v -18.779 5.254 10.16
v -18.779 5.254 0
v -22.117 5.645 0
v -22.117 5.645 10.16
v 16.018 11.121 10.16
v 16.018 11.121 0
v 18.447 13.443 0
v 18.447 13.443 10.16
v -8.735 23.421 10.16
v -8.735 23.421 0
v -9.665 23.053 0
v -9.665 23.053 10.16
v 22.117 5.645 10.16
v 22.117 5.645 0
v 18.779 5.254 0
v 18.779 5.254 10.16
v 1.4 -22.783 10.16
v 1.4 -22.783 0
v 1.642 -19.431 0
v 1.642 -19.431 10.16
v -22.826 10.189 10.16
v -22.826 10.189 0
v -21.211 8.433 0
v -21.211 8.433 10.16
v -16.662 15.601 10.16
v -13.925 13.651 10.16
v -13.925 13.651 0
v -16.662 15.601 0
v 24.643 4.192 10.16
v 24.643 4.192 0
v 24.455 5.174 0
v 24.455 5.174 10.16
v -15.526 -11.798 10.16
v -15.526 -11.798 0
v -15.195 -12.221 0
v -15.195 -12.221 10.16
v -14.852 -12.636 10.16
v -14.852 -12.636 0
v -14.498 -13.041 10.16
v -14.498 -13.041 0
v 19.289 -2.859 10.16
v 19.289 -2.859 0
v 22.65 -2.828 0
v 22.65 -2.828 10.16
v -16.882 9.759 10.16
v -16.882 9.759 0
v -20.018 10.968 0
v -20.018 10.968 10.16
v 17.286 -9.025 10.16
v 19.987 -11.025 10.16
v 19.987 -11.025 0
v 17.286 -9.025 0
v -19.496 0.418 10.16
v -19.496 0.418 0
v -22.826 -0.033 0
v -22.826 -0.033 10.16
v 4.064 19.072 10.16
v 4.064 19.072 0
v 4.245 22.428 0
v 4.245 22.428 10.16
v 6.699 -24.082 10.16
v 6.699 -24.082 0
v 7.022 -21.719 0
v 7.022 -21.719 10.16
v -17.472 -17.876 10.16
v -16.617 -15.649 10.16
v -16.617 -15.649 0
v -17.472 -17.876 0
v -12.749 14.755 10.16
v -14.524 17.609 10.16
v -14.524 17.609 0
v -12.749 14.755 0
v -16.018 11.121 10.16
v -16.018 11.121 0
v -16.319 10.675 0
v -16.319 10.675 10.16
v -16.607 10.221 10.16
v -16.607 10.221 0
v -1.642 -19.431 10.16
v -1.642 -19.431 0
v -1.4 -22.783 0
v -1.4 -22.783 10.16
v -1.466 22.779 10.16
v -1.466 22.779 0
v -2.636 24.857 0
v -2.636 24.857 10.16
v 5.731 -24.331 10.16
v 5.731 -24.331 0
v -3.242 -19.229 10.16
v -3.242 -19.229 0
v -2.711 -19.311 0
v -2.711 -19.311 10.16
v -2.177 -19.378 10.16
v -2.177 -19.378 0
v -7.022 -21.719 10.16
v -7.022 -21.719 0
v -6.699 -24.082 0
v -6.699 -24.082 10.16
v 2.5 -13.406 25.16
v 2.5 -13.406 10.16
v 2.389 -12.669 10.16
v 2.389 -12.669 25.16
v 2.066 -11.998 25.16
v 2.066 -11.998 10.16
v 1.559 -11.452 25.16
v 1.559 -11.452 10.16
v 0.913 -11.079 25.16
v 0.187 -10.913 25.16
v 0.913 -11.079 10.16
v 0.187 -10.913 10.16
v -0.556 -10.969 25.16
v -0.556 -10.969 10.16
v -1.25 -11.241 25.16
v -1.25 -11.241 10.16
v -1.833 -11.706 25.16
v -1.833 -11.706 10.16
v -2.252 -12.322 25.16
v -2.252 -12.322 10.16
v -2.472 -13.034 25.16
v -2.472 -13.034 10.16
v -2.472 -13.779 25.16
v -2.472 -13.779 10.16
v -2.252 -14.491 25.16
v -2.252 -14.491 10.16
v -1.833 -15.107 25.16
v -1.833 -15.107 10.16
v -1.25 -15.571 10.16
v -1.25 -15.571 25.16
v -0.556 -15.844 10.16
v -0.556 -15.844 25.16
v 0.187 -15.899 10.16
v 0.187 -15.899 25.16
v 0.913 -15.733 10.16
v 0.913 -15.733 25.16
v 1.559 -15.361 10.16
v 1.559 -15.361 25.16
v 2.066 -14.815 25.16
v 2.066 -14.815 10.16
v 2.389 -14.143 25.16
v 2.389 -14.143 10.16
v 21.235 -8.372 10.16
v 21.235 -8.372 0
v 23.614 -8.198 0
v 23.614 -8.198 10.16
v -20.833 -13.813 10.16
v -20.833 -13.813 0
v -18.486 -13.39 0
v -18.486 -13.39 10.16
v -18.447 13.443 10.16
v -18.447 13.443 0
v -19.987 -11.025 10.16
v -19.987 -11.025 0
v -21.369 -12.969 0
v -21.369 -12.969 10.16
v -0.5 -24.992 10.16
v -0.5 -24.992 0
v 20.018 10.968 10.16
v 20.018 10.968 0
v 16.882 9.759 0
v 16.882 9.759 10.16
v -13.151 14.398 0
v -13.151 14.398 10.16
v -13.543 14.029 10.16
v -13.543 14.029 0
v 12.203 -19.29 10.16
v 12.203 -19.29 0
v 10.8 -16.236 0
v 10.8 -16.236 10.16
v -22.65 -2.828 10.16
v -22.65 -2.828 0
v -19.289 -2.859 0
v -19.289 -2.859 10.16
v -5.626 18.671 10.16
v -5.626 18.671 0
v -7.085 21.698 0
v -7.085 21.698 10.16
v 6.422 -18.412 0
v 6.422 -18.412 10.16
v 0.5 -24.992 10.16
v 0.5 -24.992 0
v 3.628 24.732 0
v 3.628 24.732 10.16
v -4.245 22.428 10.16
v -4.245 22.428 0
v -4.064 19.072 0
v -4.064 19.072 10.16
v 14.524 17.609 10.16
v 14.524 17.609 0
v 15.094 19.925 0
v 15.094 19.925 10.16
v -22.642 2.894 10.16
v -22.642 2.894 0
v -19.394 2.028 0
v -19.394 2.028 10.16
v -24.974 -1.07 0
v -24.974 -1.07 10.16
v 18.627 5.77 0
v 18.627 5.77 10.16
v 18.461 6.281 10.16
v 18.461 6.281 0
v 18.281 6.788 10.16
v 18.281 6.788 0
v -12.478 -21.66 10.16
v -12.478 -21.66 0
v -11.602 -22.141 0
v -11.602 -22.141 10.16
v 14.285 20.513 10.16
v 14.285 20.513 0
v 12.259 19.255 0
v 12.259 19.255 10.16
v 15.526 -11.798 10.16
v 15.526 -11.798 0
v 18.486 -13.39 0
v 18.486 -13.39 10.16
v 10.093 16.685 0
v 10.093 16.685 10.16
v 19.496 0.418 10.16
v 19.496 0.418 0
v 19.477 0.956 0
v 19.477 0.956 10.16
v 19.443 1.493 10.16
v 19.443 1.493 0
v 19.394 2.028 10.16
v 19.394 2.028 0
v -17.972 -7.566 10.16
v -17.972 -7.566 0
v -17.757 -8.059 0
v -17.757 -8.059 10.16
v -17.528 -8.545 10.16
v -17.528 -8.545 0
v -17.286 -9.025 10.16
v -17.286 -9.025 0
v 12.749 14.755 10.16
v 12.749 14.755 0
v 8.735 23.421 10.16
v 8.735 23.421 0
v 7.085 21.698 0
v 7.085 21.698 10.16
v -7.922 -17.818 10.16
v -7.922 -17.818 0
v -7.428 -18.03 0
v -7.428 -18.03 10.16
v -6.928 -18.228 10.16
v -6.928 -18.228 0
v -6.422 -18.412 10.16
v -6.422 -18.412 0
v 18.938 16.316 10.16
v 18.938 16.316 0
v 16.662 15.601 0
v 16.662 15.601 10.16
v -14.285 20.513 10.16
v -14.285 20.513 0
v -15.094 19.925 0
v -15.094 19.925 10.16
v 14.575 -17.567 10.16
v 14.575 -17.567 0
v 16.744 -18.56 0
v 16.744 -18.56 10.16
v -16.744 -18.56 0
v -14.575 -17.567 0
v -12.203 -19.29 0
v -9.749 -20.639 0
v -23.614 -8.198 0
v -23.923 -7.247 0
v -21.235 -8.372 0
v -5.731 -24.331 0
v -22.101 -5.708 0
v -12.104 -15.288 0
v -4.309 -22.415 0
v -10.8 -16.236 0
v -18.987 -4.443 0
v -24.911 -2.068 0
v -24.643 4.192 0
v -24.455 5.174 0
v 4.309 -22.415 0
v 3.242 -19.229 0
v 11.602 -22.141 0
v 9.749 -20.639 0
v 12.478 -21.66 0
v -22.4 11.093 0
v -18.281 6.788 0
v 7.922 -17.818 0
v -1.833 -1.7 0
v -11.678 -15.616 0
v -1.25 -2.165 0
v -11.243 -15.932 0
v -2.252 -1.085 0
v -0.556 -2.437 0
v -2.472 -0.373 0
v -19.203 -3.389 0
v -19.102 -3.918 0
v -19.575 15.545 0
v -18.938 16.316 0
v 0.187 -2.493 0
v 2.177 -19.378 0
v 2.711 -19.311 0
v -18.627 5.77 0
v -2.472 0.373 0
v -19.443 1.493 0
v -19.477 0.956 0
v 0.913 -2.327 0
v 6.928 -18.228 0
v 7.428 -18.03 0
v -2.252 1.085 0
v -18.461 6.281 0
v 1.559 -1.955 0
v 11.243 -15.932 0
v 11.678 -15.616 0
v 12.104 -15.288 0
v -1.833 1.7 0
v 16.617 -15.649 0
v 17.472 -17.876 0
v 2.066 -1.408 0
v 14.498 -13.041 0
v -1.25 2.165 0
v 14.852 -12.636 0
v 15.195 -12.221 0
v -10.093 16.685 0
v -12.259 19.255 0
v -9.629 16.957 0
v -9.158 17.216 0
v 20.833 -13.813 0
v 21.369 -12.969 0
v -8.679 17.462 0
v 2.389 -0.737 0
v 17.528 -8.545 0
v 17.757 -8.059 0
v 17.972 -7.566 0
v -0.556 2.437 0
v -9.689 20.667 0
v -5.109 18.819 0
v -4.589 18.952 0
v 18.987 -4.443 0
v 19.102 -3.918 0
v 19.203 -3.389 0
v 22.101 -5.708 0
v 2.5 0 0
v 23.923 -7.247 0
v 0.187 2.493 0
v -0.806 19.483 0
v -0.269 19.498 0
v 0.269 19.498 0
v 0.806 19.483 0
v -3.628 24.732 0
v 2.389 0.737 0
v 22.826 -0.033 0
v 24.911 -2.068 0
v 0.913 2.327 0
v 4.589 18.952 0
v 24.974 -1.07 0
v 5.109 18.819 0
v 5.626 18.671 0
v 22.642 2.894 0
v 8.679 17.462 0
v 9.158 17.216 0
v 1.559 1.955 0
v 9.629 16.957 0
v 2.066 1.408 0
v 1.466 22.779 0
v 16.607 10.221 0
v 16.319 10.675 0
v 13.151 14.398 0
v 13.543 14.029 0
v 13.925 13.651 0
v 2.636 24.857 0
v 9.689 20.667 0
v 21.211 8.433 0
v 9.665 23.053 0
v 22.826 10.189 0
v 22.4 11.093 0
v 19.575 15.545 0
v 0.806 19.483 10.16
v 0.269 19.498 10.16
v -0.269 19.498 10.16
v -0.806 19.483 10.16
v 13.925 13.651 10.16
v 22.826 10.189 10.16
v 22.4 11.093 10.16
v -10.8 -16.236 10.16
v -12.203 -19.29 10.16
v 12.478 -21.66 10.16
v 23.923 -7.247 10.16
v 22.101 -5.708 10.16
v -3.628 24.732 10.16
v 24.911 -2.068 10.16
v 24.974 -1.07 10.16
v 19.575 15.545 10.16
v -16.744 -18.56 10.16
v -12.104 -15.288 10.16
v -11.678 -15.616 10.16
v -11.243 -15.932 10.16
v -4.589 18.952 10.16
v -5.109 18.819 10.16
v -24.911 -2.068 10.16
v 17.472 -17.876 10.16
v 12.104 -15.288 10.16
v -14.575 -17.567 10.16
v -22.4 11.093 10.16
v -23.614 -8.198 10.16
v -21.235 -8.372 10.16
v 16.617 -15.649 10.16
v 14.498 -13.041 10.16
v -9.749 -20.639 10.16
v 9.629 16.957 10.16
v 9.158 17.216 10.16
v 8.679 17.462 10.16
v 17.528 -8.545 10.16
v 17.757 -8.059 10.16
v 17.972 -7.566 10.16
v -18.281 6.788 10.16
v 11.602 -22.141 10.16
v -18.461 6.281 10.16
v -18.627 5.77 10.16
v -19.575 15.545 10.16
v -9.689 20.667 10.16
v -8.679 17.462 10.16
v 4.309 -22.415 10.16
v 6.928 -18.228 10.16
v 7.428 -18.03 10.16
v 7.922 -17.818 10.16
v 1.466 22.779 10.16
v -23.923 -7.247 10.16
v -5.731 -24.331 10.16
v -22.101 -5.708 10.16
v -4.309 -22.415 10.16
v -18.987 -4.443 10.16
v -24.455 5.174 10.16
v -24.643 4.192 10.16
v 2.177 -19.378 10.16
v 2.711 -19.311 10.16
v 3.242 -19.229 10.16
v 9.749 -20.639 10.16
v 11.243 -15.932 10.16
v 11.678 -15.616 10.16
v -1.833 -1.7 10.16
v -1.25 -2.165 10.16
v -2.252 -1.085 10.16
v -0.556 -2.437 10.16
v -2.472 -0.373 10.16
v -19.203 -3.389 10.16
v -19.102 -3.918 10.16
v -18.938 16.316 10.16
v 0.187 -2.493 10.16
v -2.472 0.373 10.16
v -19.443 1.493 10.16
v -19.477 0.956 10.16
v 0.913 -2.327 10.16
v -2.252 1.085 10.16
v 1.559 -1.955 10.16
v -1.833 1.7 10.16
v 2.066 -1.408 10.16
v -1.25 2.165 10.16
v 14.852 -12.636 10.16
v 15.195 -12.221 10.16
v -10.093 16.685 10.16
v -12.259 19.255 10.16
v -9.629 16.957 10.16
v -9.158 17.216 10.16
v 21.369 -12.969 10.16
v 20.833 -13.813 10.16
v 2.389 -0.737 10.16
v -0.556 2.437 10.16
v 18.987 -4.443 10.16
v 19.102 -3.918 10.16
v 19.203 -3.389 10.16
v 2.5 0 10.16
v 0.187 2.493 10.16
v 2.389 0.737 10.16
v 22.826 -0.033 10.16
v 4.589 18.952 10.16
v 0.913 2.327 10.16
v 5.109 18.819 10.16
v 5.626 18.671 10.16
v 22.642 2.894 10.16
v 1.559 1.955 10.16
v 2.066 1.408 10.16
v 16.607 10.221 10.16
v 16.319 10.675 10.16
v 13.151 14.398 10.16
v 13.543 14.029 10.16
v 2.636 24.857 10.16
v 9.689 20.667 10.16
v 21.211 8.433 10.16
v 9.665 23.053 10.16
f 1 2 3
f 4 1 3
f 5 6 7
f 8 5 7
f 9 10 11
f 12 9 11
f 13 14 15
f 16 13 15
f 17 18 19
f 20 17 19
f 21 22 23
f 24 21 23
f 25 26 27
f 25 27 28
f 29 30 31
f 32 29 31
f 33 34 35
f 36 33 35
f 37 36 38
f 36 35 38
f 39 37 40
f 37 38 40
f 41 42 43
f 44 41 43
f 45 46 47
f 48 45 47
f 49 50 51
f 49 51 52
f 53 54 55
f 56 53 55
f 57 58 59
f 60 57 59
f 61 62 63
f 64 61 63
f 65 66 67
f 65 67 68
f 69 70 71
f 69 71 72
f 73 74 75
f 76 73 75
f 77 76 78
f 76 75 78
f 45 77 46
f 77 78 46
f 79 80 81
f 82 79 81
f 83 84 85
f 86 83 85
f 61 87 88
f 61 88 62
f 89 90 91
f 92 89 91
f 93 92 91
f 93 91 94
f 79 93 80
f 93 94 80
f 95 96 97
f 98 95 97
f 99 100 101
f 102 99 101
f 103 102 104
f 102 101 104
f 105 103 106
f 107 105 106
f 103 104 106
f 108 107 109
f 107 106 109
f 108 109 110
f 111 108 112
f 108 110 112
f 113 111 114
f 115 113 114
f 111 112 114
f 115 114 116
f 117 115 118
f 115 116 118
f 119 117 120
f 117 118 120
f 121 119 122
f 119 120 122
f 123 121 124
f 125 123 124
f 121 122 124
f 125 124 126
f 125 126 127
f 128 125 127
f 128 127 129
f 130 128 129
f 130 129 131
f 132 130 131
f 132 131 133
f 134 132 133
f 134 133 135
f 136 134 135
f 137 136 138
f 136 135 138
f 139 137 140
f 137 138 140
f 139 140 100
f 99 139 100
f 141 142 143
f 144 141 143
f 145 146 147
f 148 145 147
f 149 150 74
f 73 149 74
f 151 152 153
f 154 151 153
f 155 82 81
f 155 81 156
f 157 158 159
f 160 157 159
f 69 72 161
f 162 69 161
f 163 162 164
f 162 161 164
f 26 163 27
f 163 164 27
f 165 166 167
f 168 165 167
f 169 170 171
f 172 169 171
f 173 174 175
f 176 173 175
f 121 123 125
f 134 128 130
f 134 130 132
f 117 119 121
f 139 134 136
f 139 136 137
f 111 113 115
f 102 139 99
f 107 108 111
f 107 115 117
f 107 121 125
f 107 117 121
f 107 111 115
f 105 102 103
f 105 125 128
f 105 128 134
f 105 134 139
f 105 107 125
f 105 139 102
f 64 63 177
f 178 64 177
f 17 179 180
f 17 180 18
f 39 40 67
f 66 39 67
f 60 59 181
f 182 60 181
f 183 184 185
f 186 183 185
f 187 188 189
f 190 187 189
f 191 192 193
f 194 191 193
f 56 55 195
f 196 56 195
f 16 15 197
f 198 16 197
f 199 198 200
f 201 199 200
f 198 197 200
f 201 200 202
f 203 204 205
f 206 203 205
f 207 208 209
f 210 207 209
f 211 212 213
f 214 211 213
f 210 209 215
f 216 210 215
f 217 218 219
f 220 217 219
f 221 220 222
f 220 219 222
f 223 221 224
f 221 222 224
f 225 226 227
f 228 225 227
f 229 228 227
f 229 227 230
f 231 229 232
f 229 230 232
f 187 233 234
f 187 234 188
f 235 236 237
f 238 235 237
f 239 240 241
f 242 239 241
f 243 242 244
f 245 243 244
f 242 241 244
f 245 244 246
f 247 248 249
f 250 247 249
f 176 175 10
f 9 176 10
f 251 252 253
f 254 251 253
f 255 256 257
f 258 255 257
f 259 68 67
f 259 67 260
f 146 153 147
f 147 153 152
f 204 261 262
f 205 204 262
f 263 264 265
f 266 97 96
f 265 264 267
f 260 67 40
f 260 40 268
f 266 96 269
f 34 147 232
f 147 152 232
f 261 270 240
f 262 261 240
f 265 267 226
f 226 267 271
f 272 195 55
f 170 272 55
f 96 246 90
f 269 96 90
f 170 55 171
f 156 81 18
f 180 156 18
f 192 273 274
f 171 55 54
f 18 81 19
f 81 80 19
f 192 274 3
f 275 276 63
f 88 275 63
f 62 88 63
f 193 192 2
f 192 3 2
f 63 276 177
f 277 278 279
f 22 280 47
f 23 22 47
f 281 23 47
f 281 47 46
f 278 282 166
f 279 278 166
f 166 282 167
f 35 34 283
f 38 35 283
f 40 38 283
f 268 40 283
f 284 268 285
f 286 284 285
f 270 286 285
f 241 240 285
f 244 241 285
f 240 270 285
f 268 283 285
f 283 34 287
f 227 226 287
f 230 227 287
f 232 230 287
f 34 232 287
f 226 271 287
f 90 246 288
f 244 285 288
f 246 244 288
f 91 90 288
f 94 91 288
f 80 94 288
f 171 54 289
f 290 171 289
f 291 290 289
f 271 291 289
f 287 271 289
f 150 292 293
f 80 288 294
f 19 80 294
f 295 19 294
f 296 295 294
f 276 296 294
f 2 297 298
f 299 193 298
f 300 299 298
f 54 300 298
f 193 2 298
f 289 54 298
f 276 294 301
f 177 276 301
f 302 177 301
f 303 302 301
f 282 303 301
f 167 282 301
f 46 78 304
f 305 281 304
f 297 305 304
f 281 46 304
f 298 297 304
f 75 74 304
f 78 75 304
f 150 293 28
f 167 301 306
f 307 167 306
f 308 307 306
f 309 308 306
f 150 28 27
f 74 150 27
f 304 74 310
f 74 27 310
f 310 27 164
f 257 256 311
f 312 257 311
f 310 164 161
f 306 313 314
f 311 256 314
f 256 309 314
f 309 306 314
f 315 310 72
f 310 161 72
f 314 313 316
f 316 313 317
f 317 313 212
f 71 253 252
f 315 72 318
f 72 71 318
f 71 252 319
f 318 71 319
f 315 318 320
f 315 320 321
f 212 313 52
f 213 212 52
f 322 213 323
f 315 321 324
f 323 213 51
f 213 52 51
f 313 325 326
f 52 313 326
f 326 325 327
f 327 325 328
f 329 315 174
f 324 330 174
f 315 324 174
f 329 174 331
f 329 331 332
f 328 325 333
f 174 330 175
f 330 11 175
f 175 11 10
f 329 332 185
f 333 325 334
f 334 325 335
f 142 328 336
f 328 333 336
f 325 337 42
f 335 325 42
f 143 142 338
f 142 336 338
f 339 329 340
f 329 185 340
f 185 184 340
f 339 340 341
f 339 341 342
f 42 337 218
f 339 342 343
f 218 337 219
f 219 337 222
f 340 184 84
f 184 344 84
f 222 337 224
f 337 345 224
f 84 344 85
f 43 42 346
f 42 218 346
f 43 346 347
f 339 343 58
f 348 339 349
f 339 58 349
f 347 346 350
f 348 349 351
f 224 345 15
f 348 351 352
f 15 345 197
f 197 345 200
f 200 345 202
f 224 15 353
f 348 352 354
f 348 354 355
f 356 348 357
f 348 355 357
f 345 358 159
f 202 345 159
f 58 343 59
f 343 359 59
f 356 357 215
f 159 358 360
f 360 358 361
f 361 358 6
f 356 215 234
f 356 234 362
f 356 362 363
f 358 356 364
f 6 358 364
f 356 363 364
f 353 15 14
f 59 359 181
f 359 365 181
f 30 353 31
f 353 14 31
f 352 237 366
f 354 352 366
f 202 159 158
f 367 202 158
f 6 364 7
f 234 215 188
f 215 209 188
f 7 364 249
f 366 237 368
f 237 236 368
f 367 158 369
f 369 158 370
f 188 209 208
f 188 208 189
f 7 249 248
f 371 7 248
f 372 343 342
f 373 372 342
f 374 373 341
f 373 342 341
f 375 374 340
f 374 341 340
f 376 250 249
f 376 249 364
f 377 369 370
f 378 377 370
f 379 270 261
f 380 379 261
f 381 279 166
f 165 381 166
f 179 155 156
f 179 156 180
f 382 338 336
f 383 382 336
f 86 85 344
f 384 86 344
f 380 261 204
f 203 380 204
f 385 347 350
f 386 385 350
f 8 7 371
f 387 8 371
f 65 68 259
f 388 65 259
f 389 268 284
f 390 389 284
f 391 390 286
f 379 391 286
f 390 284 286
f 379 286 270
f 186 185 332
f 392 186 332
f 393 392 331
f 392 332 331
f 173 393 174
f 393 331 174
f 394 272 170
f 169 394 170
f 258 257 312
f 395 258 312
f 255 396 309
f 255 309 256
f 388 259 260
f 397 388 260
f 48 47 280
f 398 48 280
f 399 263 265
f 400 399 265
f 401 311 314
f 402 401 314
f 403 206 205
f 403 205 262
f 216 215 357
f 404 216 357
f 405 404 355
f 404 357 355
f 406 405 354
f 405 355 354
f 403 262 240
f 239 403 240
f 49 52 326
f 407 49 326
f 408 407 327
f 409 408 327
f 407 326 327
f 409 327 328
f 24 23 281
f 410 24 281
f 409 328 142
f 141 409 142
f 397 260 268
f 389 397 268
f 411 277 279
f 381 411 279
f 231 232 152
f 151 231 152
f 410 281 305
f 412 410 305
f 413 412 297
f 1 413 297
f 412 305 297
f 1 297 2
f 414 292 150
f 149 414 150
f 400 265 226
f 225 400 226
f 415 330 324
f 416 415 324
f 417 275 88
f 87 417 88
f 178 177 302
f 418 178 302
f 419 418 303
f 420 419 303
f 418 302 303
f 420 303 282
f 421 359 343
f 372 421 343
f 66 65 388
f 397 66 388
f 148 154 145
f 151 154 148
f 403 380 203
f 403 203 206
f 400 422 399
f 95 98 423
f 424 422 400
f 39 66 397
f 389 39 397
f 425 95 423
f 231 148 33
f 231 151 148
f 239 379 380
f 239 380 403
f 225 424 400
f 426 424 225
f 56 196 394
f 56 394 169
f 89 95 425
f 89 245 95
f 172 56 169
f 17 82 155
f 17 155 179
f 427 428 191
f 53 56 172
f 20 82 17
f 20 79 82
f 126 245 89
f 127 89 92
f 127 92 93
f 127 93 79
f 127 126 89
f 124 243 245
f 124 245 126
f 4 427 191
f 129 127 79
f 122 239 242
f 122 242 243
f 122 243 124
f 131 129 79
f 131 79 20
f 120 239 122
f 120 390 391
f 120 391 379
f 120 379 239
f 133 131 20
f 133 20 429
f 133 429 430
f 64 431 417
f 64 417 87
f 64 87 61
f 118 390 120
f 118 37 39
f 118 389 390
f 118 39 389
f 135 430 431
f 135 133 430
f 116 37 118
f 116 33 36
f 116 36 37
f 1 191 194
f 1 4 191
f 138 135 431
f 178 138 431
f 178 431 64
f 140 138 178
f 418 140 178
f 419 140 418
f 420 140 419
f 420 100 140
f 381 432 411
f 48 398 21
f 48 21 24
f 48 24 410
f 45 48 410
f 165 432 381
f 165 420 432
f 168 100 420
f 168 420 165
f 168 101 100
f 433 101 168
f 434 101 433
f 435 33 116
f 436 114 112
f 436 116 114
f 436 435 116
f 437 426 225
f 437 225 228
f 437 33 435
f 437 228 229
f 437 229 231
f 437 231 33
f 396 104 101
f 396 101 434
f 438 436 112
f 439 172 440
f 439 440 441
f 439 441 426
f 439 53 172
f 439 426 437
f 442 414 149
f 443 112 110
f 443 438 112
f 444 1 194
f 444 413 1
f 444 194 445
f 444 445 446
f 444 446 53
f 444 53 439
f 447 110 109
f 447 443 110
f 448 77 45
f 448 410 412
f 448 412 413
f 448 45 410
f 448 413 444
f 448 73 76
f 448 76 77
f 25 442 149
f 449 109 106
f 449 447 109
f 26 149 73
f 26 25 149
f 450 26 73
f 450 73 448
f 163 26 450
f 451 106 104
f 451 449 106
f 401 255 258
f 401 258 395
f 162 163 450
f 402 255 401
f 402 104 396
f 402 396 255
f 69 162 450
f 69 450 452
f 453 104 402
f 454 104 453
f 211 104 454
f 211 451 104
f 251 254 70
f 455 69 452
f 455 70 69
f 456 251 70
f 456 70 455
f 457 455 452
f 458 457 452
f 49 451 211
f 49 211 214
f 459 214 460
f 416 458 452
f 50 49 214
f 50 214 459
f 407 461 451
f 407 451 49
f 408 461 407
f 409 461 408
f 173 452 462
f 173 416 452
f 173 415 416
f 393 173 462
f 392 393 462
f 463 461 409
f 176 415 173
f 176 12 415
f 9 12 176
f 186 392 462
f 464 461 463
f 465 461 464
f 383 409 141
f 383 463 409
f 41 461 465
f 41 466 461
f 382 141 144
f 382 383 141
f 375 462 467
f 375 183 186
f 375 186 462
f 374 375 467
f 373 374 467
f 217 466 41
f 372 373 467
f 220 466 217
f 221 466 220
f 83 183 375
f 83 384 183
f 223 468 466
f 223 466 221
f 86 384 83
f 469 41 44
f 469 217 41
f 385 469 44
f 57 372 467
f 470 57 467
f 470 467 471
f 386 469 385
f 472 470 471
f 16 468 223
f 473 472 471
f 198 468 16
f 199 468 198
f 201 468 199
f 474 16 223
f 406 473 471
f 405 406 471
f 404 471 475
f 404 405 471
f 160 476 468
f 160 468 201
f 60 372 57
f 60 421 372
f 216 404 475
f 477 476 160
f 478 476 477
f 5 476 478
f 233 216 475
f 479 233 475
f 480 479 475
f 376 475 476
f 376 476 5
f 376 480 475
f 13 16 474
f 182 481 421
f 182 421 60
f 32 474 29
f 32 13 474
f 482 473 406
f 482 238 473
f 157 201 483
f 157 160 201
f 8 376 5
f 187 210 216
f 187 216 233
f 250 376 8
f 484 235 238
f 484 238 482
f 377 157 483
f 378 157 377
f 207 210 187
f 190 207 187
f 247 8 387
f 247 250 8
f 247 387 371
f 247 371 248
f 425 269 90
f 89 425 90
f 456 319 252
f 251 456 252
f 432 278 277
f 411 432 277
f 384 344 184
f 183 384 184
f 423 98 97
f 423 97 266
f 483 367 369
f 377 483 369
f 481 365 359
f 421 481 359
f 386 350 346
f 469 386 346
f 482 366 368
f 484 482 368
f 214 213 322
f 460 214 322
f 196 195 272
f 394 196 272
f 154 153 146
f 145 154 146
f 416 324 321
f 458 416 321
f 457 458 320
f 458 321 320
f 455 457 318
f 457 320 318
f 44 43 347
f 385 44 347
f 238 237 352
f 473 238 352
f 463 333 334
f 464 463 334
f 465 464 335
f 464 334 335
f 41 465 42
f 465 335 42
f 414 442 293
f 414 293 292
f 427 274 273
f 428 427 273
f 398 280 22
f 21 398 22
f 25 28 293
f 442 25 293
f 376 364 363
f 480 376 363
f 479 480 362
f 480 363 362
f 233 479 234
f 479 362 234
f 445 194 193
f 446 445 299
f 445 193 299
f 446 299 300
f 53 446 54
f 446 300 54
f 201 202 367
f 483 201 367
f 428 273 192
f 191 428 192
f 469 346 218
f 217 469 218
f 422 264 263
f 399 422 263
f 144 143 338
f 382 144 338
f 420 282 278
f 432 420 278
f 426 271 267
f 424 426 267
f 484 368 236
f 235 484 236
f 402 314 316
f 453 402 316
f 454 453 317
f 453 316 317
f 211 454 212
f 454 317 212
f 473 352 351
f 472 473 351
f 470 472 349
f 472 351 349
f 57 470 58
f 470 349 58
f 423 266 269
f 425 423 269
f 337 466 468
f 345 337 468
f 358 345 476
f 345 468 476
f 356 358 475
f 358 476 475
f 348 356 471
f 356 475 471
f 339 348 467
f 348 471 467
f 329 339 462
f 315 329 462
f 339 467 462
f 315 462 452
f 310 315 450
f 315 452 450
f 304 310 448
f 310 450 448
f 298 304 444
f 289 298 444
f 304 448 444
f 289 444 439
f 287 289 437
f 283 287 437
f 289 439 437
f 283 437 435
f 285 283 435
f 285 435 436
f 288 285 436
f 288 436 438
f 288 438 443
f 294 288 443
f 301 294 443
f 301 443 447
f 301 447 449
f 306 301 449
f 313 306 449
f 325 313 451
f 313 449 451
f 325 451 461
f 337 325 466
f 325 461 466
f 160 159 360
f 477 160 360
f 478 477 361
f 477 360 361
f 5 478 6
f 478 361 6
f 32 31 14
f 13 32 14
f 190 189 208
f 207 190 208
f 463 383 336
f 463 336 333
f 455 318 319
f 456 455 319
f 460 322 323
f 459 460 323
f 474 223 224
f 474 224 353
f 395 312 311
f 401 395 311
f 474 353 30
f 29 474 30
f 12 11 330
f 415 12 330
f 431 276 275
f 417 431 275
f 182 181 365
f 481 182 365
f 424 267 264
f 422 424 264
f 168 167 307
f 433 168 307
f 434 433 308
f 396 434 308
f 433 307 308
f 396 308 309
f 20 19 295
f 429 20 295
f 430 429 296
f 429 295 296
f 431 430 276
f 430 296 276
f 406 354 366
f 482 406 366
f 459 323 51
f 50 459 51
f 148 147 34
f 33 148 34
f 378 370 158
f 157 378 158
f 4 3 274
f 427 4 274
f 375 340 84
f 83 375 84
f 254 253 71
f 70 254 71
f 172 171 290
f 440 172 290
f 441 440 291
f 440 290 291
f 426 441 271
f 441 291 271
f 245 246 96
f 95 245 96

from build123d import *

# Parameters (mm, degrees)
BOSS_EXTRUDE1_DEPTH = 10.16
SKETCH2_R           = 2.5
CUT_EXTRUDE1_DEPTH  = 10.16
SKETCH5_R           = 2.5
BOSS_EXTRUDE2_DEPTH = 15


with BuildPart() as part:
    # Sketch1 → Boss-Extrude1 (new body)
    with BuildSketch(Plane.XY):
        with BuildLine():
            Line((21.369115072, -12.969065822), (19.986578913, -11.025302977))
            Line((19.986578913, -11.025302977), (17.28565357, -9.025307787))
            ThreePointArc((17.28565357, -9.025307787), (17.644127523, -8.302696186), (17.972409434, -7.565877287))
            Line((17.972409434, -7.565877287), (21.235066822, -8.372131118))
            Line((21.235066822, -8.372131118), (23.614023549, -8.19839247))
            Line((23.614023549, -8.19839247), (23.923040543, -7.247335954))
            Line((23.923040543, -7.247335954), (22.100545137, -5.708462756))
            Line((22.100545137, -5.708462756), (18.987095752, -4.442993911))
            ThreePointArc((18.987095752, -4.442993911), (19.154601389, -3.653935634), (19.289330312, -2.858624865))
            Line((19.289330312, -2.858624865), (22.649992492, -2.828158852))
            Line((22.649992492, -2.828158852), (24.911002874, -2.068256043))
            Line((24.911002874, -2.068256043), (24.973793394, -1.070229315))
            Line((24.973793394, -1.070229315), (22.82585283, -0.032938825))
            Line((22.82585283, -0.032938825), (19.495508879, 0.418489613))
            ThreePointArc((19.495508879, 0.418489613), (19.461521204, 1.224415131), (19.394231625, 2.02824547))
            Line((19.394231625, 2.02824547), (22.641735833, 2.893517036))
            Line((22.641735833, 2.893517036), (24.642732273, 4.191836518))
            Line((24.642732273, 4.191836518), (24.455350958, 5.174123768))
            Line((24.455350958, 5.174123768), (22.116928242, 5.644654774))
            Line((22.116928242, 5.644654774), (18.778947483, 5.253677896))
            ThreePointArc((18.778947483, 5.253677896), (18.545602068, 6.02583139), (18.280522038, 6.787673684))
            Line((18.280522038, 6.787673684), (21.210815641, 8.433382607))
            Line((21.210815641, 8.433382607), (22.826068173, 10.188540573))
            Line((22.826068173, 10.188540573), (22.400288882, 11.093367626))
            Line((22.400288882, 11.093367626), (20.018315712, 10.967573953))
            Line((20.018315712, 10.967573953), (16.882435753, 9.758758274))
            ThreePointArc((16.882435753, 9.758758274), (16.464394547, 10.448622502), (16.01818002, 11.120607396))
            Line((16.01818002, 11.120607396), (18.447141895, 13.443347733))
            Line((18.447141895, 13.443347733), (19.575158262, 15.545061154))
            Line((19.575158262, 15.545061154), (18.937734272, 16.315574397))
            Line((18.937734272, 16.315574397), (16.661878784, 15.601360125))
            Line((16.661878784, 15.601360125), (13.925138495, 13.65065998))
            ThreePointArc((13.925138495, 13.65065998), (13.348668566, 14.214888235), (12.749356841, 14.754792447))
            Line((12.749356841, 14.754792447), (14.524366379, 17.60861788))
            Line((14.524366379, 17.60861788), (15.094269164, 19.924828372))
            Line((15.094269164, 19.924828372), (14.28525217, 20.512613624))
            Line((14.28525217, 20.512613624), (12.258514734, 19.254855463))
            Line((12.258514734, 19.254855463), (10.092873572, 16.684840516))
            ThreePointArc((10.092873572, 16.684840516), (9.394196645, 17.087980261), (8.679444682, 17.461879624))
            Line((8.679444682, 17.461879624), (9.688971507, 20.667473805))
            Line((9.688971507, 20.667473805), (9.664951622, 23.052645345))
            Line((9.664951622, 23.052645345), (8.735175137, 23.420769898))
            Line((8.735175137, 23.420769898), (7.084903119, 21.698497417))
            Line((7.084903119, 21.698497417), (5.626436284, 18.67065116))
            ThreePointArc((5.626436284, 18.67065116), (4.8494528, 18.887371642), (4.064171094, 19.071772684))
            Line((4.064171094, 19.071772684), (4.244782922, 22.427716342))
            Line((4.244782922, 22.427716342), (3.628349625, 24.731979829))
            Line((3.628349625, 24.731979829), (2.636234924, 24.857313063))
            Line((2.636234924, 24.857313063), (1.466120985, 22.778742977))
            Line((1.466120985, 22.778742977), (0.806469312, 19.483316126))
            ThreePointArc((0.806469312, 19.483316126), (0, 19.5), (-0.806469312, 19.483316126))
            Line((-0.806469312, 19.483316126), (-1.466120985, 22.778742977))
            Line((-1.466120985, 22.778742977), (-2.636234924, 24.857313063))
            Line((-2.636234924, 24.857313063), (-3.628349625, 24.731979829))
            Line((-3.628349625, 24.731979829), (-4.244782922, 22.427716342))
            Line((-4.244782922, 22.427716342), (-4.064171094, 19.071772684))
            ThreePointArc((-4.064171094, 19.071772684), (-4.8494528, 18.887371642), (-5.626436284, 18.67065116))
            Line((-5.626436284, 18.67065116), (-7.084903119, 21.698497417))
            Line((-7.084903119, 21.698497417), (-8.735175137, 23.420769898))
            Line((-8.735175137, 23.420769898), (-9.664951622, 23.052645345))
            Line((-9.664951622, 23.052645345), (-9.688971507, 20.667473805))
            Line((-9.688971507, 20.667473805), (-8.679444682, 17.461879624))
            ThreePointArc((-8.679444682, 17.461879624), (-9.394196645, 17.087980261), (-10.092873572, 16.684840516))
            Line((-10.092873572, 16.684840516), (-12.258514734, 19.254855463))
            Line((-12.258514734, 19.254855463), (-14.28525217, 20.512613624))
            Line((-14.28525217, 20.512613624), (-15.094269164, 19.924828372))
            Line((-15.094269164, 19.924828372), (-14.524366379, 17.60861788))
            Line((-14.524366379, 17.60861788), (-12.749356841, 14.754792447))
            ThreePointArc((-12.749356841, 14.754792447), (-13.348668566, 14.214888235), (-13.925138495, 13.65065998))
            Line((-13.925138495, 13.65065998), (-16.661878784, 15.601360125))
            Line((-16.661878784, 15.601360125), (-18.937734272, 16.315574397))
            Line((-18.937734272, 16.315574397), (-19.575158262, 15.545061154))
            Line((-19.575158262, 15.545061154), (-18.447141895, 13.443347733))
            Line((-18.447141895, 13.443347733), (-16.01818002, 11.120607396))
            ThreePointArc((-16.01818002, 11.120607396), (-16.464394547, 10.448622502), (-16.882435753, 9.758758274))
            Line((-16.882435753, 9.758758274), (-20.018315712, 10.967573953))
            Line((-20.018315712, 10.967573953), (-22.400288882, 11.093367626))
            Line((-22.400288882, 11.093367626), (-22.826068173, 10.188540573))
            Line((-22.826068173, 10.188540573), (-21.210815641, 8.433382607))
            Line((-21.210815641, 8.433382607), (-18.280522038, 6.787673684))
            ThreePointArc((-18.280522038, 6.787673684), (-18.545602068, 6.02583139), (-18.778947483, 5.253677896))
            Line((-18.778947483, 5.253677896), (-22.116928242, 5.644654774))
            Line((-22.116928242, 5.644654774), (-24.455350958, 5.174123768))
            Line((-24.455350958, 5.174123768), (-24.642732273, 4.191836518))
            Line((-24.642732273, 4.191836518), (-22.641735833, 2.893517036))
            Line((-22.641735833, 2.893517036), (-19.394231625, 2.02824547))
            ThreePointArc((-19.394231625, 2.02824547), (-19.461521204, 1.224415131), (-19.495508879, 0.418489613))
            Line((-19.495508879, 0.418489613), (-22.82585283, -0.032938825))
            Line((-22.82585283, -0.032938825), (-24.973793394, -1.070229315))
            Line((-24.973793394, -1.070229315), (-24.911002874, -2.068256043))
            Line((-24.911002874, -2.068256043), (-22.649992492, -2.828158852))
            Line((-22.649992492, -2.828158852), (-19.289330312, -2.858624865))
            ThreePointArc((-19.289330312, -2.858624865), (-19.154601389, -3.653935634), (-18.987095752, -4.442993911))
            Line((-18.987095752, -4.442993911), (-22.100545137, -5.708462756))
            Line((-22.100545137, -5.708462756), (-23.923040543, -7.247335954))
            Line((-23.923040543, -7.247335954), (-23.614023549, -8.19839247))
            Line((-23.614023549, -8.19839247), (-21.235066822, -8.372131118))
            Line((-21.235066822, -8.372131118), (-17.972409434, -7.565877287))
            ThreePointArc((-17.972409434, -7.565877287), (-17.644127523, -8.302696186), (-17.28565357, -9.025307787))
            Line((-17.28565357, -9.025307787), (-19.986578913, -11.025302977))
            Line((-19.986578913, -11.025302977), (-21.369115072, -12.969065822))
            Line((-21.369115072, -12.969065822), (-20.833288277, -13.813393747))
            Line((-20.833288277, -13.813393747), (-18.485863806, -13.390051595))
            Line((-18.485863806, -13.390051595), (-15.526215974, -11.797737814))
            ThreePointArc((-15.526215974, -11.797737814), (-15.025008234, -12.4297678), (-14.498090202, -13.040528383))
            Line((-14.498090202, -13.040528383), (-16.61678243, -15.649382865))
            Line((-16.61678243, -15.649382865), (-17.472489512, -17.875901587))
            Line((-17.472489512, -17.875901587), (-16.743520884, -18.560448692))
            Line((-16.743520884, -18.560448692), (-14.575125981, -17.566625886))
            Line((-14.575125981, -17.566625886), (-12.104453263, -15.288303085))
            ThreePointArc((-12.104453263, -15.288303085), (-11.46181242, -15.77583139), (-10.799558506, -16.23636462))
            Line((-10.799558506, -16.23636462), (-12.202892395, -19.290154472))
            Line((-12.202892395, -19.290154472), (-12.478003175, -21.659528712))
            Line((-12.478003175, -21.659528712), (-11.601696495, -22.141282386))
            Line((-11.601696495, -22.141282386), (-9.748579387, -20.639424467))
            Line((-9.748579387, -20.639424467), (-7.922123236, -17.818248046))
            ThreePointArc((-7.922123236, -17.818248046), (-7.178428777, -18.130641475), (-6.422450831, -18.412010355))
            Line((-6.422450831, -18.412010355), (-7.022249752, -21.71885473))
            Line((-7.022249752, -21.71885473), (-6.699478009, -24.08220799))
            Line((-6.699478009, -24.08220799), (-5.730894848, -24.330897877))
            Line((-5.730894848, -24.330897877), (-4.309493697, -22.415372101))
            Line((-4.309493697, -22.415372101), (-3.242017071, -19.228606952))
            ThreePointArc((-3.242017071, -19.228606952), (-2.443998055, -19.346236676), (-1.64179695, -19.430761765))
            Line((-1.64179695, -19.430761765), (-1.40037333, -22.782879469))
            Line((-1.40037333, -22.782879469), (-0.5, -24.991713572))
            Line((-0.5, -24.991713572), (0.5, -24.991713572))
            Line((0.5, -24.991713572), (1.40037333, -22.782879469))
            Line((1.40037333, -22.782879469), (1.64179695, -19.430761765))
            ThreePointArc((1.64179695, -19.430761765), (2.443998055, -19.346236676), (3.242017071, -19.228606952))
            Line((3.242017071, -19.228606952), (4.309493697, -22.415372101))
            Line((4.309493697, -22.415372101), (5.730894848, -24.330897877))
            Line((5.730894848, -24.330897877), (6.699478009, -24.08220799))
            Line((6.699478009, -24.08220799), (7.022249752, -21.71885473))
            Line((7.022249752, -21.71885473), (6.422450831, -18.412010355))
            ThreePointArc((6.422450831, -18.412010355), (7.178428777, -18.130641475), (7.922123236, -17.818248046))
            Line((7.922123236, -17.818248046), (9.748579387, -20.639424467))
            Line((9.748579387, -20.639424467), (11.601696495, -22.141282386))
            Line((11.601696495, -22.141282386), (12.478003175, -21.659528712))
            Line((12.478003175, -21.659528712), (12.202892395, -19.290154472))
            Line((12.202892395, -19.290154472), (10.799558506, -16.23636462))
            ThreePointArc((10.799558506, -16.23636462), (11.46181242, -15.77583139), (12.104453263, -15.288303085))
            Line((12.104453263, -15.288303085), (14.575125981, -17.566625886))
            Line((14.575125981, -17.566625886), (16.743520884, -18.560448692))
            Line((16.743520884, -18.560448692), (17.472489512, -17.875901587))
            Line((17.472489512, -17.875901587), (16.61678243, -15.649382865))
            Line((16.61678243, -15.649382865), (14.498090202, -13.040528383))
            ThreePointArc((14.498090202, -13.040528383), (15.025008234, -12.4297678), (15.526215974, -11.797737814))
            Line((15.526215974, -11.797737814), (18.485863806, -13.390051595))
            Line((18.485863806, -13.390051595), (20.833288277, -13.813393747))
            Line((20.833288277, -13.813393747), (21.369115072, -12.969065822))
        make_face()
    extrude(amount=BOSS_EXTRUDE1_DEPTH)

    # Sketch2 → Cut-Extrude1 (cut)
    with BuildSketch(Plane.XY.offset(10.16)):
        Circle(SKETCH2_R)
    extrude(amount=-CUT_EXTRUDE1_DEPTH, mode=Mode.SUBTRACT)

    # Sketch5 → Boss-Extrude2 (add)
    with BuildSketch(Plane.XY.offset(10.16)):
        with Locations((0, -13.406225592)):
            Circle(SKETCH5_R)
    extrude(amount=BOSS_EXTRUDE2_DEPTH)


solid = part.part
